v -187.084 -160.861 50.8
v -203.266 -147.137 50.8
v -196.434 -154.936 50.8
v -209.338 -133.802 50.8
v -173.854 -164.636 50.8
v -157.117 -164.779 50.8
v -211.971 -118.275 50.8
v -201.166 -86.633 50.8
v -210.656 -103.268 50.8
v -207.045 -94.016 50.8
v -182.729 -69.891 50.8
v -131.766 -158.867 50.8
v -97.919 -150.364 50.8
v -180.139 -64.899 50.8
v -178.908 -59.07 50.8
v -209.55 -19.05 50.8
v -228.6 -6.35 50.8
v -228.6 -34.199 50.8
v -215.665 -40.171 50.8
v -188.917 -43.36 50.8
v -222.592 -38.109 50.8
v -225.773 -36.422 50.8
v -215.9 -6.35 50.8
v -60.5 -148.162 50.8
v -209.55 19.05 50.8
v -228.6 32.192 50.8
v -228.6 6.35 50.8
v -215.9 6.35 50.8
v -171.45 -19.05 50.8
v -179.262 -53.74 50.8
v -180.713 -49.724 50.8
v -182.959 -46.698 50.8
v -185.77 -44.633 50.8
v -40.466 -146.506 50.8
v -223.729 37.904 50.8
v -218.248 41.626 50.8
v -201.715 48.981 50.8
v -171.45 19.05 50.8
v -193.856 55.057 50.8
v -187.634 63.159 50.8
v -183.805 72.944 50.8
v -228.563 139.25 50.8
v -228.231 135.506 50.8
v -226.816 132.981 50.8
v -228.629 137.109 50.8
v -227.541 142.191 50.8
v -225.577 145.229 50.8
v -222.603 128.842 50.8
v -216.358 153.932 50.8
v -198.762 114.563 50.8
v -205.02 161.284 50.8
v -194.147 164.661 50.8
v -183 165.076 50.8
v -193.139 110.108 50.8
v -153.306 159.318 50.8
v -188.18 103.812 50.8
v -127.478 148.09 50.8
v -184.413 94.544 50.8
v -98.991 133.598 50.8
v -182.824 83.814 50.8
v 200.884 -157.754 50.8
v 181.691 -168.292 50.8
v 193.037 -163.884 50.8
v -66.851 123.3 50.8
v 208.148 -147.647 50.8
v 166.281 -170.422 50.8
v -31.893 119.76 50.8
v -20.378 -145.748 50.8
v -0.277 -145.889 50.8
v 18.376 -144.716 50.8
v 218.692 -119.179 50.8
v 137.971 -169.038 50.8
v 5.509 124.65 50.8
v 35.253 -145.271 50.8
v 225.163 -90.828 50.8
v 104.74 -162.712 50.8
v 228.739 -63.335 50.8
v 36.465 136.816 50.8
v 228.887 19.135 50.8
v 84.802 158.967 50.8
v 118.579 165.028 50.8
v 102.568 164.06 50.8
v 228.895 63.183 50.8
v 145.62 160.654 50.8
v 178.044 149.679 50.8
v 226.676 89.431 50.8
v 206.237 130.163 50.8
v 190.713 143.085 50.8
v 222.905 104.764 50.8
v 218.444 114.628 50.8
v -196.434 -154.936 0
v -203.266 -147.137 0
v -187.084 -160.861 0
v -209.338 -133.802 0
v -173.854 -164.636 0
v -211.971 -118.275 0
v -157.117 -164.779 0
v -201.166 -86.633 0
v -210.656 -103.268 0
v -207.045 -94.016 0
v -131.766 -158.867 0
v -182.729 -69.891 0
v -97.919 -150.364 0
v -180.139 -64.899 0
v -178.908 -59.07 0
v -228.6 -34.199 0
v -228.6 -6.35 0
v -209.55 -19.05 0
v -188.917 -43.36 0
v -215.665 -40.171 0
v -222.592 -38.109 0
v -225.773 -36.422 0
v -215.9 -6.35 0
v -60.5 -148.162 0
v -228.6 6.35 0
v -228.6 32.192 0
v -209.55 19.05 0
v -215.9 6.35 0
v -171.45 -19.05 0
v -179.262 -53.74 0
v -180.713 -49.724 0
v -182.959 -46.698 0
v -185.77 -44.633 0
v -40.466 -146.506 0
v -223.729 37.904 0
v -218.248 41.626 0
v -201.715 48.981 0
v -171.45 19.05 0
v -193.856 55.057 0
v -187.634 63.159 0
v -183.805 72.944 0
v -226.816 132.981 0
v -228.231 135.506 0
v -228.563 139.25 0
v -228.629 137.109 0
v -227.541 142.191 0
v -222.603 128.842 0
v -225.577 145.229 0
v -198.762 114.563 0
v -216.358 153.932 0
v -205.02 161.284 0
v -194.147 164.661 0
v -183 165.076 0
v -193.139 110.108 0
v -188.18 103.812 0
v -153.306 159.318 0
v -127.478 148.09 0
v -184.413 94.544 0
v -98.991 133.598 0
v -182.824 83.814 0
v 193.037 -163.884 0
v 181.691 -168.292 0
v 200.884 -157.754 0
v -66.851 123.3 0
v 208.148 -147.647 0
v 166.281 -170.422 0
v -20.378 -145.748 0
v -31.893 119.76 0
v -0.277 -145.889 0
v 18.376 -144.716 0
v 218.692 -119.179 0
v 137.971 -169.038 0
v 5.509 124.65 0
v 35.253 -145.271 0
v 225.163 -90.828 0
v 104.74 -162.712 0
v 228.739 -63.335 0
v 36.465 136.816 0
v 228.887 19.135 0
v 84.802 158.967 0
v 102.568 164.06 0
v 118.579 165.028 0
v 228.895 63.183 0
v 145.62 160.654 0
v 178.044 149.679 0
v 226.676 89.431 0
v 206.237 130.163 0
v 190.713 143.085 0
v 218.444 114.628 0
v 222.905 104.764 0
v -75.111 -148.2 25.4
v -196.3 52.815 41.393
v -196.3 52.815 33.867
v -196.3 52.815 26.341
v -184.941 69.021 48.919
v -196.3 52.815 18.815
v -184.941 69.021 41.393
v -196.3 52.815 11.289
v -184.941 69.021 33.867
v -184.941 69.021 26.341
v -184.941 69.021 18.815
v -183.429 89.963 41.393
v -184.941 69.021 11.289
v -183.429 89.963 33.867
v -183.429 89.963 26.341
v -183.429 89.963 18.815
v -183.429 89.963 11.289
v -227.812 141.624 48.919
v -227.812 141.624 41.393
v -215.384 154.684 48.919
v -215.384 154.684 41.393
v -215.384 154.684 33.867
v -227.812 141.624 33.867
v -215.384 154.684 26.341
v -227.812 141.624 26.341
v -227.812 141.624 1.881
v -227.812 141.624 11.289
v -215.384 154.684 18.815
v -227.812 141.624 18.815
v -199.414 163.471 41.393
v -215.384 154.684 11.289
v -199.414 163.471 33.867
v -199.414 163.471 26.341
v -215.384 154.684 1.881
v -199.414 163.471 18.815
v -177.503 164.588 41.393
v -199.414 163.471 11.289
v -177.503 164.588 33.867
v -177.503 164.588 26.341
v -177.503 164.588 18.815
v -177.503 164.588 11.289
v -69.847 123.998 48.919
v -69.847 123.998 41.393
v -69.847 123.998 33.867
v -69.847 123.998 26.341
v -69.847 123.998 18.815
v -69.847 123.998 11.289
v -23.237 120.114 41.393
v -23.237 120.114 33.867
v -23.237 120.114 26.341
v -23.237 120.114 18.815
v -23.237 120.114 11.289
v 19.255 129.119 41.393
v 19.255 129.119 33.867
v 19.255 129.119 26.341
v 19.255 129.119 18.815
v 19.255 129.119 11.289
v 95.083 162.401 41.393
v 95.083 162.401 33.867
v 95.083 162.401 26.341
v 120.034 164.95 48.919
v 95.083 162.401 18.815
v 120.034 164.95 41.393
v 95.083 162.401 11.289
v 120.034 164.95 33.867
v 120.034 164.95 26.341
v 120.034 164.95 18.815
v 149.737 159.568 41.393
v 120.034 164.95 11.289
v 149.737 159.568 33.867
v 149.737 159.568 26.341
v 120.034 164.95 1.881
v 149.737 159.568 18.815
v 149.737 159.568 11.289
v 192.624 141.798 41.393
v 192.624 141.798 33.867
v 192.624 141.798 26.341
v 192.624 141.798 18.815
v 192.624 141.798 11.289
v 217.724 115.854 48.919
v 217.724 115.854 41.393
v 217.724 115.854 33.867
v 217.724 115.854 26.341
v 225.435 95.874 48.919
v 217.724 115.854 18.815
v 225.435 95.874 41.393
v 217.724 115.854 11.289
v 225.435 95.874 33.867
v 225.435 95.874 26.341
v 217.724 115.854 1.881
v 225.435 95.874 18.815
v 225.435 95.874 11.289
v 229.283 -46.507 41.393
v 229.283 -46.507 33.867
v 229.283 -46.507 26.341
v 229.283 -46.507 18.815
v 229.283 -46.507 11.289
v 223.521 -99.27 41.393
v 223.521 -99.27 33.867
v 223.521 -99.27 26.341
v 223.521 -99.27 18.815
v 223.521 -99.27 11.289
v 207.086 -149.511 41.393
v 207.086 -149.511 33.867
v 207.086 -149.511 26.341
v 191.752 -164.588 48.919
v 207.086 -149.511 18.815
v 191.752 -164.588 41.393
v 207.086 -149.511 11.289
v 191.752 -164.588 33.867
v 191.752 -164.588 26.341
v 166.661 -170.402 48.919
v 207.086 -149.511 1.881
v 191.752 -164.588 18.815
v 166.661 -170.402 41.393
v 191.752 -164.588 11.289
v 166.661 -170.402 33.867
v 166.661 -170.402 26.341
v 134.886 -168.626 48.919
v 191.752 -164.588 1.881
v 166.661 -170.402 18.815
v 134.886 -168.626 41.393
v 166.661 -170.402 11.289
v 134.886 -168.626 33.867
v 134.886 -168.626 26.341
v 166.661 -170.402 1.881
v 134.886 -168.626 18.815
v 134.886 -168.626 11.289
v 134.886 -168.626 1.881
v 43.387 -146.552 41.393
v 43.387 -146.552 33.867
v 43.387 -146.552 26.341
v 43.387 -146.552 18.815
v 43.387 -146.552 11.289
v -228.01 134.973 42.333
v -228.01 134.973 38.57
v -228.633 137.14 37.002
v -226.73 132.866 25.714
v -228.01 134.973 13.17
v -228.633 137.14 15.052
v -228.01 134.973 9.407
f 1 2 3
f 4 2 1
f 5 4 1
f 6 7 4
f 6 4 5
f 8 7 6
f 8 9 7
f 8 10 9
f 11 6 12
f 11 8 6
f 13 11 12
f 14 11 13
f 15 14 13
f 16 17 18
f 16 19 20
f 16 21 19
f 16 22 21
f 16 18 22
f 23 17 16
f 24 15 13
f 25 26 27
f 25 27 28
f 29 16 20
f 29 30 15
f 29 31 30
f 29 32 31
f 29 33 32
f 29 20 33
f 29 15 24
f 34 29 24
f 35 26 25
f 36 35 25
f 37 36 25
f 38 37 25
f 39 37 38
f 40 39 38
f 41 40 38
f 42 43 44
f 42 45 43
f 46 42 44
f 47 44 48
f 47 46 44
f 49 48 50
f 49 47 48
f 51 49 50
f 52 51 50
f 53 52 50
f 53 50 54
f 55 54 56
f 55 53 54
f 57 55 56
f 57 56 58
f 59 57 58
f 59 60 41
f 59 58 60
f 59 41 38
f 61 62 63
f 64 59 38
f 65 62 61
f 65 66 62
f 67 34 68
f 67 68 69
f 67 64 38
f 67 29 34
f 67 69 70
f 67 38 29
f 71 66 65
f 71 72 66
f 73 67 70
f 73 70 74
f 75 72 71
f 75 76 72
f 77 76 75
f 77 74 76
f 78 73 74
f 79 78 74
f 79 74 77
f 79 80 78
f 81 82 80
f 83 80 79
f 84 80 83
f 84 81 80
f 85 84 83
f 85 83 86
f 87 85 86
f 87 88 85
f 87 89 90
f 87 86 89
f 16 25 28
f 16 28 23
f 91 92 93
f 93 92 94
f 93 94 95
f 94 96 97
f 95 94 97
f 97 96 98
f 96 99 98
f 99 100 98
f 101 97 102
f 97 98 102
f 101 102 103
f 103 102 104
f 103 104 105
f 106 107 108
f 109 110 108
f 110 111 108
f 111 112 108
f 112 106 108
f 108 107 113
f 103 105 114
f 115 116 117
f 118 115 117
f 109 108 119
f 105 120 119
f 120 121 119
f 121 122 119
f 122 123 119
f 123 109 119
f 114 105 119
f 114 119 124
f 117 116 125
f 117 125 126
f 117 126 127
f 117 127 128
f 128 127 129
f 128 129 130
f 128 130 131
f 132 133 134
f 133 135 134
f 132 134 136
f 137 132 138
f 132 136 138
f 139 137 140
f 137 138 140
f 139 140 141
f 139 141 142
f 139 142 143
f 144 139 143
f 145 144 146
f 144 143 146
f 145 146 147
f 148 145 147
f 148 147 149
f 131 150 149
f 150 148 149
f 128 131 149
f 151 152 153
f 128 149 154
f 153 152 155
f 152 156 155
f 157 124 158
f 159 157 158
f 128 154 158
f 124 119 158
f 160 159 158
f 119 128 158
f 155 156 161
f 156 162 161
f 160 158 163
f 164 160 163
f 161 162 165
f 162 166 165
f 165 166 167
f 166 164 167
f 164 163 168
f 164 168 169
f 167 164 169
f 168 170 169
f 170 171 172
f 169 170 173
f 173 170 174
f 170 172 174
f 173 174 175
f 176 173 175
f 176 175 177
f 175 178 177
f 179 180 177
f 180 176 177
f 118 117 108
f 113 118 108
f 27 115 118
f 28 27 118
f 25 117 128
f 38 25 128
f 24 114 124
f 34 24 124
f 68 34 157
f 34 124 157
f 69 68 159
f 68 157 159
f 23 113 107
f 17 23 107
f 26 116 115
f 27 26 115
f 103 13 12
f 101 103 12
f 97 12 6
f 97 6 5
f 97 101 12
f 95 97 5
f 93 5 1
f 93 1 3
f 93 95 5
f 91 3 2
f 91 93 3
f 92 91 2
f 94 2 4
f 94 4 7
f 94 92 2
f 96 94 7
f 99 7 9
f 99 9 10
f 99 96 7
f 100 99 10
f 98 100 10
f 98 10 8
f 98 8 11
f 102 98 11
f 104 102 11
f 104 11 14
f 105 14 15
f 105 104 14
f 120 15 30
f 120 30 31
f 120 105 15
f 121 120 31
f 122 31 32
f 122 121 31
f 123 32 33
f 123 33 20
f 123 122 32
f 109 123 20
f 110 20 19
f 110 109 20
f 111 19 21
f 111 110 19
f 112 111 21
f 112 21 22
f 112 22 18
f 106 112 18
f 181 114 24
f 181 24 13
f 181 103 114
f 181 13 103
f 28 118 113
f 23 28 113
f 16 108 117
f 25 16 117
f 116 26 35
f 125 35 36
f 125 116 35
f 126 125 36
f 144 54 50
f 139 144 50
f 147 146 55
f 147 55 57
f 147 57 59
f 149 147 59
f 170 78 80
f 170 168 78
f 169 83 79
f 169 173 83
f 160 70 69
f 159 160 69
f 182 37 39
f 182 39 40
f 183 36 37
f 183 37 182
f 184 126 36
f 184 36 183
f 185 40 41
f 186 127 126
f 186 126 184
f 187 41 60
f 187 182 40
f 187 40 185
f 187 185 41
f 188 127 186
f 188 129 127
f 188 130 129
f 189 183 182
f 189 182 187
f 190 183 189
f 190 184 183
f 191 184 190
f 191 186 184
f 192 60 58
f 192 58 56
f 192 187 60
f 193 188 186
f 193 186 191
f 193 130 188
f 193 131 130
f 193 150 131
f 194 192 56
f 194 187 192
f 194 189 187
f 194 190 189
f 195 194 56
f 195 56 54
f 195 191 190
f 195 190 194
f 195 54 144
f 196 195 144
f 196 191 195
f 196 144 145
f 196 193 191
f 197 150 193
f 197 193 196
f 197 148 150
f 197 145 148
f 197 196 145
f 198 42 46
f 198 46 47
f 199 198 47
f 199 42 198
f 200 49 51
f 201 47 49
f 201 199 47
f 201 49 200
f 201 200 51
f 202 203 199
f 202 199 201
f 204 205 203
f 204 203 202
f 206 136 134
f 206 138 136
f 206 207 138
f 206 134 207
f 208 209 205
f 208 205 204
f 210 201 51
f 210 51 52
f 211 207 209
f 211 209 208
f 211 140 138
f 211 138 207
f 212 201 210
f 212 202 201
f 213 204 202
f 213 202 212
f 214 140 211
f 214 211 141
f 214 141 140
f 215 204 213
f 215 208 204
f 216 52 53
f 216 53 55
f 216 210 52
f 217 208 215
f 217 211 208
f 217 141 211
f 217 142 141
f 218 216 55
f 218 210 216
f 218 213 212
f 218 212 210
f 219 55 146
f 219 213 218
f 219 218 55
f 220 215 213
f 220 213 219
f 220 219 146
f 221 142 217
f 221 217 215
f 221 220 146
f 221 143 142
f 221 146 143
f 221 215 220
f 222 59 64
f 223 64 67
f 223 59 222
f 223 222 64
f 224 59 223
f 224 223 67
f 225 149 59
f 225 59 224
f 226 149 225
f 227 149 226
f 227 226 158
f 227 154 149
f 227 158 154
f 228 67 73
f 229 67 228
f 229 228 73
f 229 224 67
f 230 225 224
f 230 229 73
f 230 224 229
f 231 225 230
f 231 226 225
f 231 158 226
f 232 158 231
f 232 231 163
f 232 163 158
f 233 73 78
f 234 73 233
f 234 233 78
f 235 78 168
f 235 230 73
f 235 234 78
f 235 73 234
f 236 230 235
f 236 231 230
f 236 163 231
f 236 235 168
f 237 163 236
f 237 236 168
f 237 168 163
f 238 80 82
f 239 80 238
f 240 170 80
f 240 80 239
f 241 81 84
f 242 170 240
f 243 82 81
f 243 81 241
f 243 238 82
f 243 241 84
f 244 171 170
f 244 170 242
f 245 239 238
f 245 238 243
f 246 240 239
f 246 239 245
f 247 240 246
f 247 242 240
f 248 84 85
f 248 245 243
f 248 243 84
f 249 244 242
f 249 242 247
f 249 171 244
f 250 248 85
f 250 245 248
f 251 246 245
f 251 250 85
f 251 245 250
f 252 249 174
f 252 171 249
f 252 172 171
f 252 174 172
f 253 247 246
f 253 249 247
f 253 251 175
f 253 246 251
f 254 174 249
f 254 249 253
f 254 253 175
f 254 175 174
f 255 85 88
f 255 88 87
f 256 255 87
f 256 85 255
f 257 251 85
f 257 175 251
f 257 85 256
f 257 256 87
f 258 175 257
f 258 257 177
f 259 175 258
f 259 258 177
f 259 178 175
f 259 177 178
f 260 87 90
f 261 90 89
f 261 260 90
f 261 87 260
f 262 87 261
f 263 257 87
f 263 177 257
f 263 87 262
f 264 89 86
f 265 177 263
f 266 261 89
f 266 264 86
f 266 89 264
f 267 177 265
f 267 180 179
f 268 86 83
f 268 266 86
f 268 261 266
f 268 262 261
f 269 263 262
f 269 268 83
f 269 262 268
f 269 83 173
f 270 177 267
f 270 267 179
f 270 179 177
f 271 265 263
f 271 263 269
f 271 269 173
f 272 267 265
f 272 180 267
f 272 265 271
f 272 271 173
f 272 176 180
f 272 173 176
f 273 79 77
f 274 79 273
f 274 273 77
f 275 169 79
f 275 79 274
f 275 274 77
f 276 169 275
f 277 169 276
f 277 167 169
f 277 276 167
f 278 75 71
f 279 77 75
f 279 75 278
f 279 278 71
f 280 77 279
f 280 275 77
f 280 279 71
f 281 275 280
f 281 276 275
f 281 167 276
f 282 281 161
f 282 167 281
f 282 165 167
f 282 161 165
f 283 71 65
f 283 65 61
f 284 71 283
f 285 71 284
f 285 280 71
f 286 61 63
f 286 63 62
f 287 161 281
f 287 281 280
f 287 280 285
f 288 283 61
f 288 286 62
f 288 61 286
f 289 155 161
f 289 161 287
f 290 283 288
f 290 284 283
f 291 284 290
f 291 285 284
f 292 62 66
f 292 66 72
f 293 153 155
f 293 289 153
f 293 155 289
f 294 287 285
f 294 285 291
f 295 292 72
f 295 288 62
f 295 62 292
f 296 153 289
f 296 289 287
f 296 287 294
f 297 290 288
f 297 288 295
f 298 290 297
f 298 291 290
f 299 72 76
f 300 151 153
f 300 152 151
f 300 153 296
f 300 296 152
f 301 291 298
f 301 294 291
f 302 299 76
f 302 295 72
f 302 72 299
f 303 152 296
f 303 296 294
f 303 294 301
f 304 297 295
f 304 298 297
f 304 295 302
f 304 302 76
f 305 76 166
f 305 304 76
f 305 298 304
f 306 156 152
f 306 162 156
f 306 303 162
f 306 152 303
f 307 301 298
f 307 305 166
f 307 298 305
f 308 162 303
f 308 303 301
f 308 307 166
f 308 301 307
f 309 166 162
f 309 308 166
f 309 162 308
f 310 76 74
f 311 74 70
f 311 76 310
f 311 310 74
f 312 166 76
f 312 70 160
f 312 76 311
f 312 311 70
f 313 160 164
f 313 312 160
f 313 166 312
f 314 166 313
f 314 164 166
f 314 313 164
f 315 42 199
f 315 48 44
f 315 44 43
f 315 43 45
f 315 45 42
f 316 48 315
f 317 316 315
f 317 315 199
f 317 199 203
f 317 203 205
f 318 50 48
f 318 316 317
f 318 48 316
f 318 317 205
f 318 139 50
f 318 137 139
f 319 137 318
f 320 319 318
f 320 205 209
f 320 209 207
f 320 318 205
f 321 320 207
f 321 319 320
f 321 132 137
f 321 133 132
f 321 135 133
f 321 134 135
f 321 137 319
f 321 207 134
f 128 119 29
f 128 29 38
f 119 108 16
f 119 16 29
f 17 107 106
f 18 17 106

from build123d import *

# Parameters (mm, degrees)
F0_W     = 38.1
F0_H     = 38.1
F1_DEPTH = 50.8


with BuildPart() as f1:
    # F0 (on Top) → F1 (new body)
    with BuildSketch(Plane.XY):
        with BuildLine():
            Line((-228.6, 32.1917161345), (-228.6, 6.35))
            Line((-228.6, 6.35), (-215.9, 6.35))
            Line((-215.9, 6.35), (-215.9, -6.35))
            Line((-215.9, -6.35), (-228.6, -6.35))
            Line((-228.6, -6.35), (-228.6, -34.1989696026))
            add(Edge.make_bspline(
                [(-60.5002641678, -148.1617689133), (-66.5005939975, -148.1920038294), (-73.2961742589, -147.7400798137), (-113.8053654337, -150.7602742609), (-159.0025882902, -170.6546271451), (-210.2629173909, -157.2359768705), (-217.554857804, -88.5993198257), (-176.493256404, -74.2755969971), (-178.6218818379, -34.4669105888), (-217.486655562, -44.8664744461), (-228.6, -34.1989696026)],
                knots=[0.7551474079, 0.7551474079, 0.7551474079, 0.7551474079, 0.7709603375, 0.797321274, 0.8281985508, 0.8569640319, 0.8887766406, 0.9150101165, 0.9359092043, 0.9648400573, 0.9648400573, 0.9648400573, 0.9648400573], degree=3))
            ThreePointArc((-60.5002641678, -148.1617689133), (-30.426607809, -146.014377891), (-0.2766438162, -145.8888142753))
            add(Edge.make_bspline(
                [(-228.6, 32.1917161345), (-221.842404284, 42.7562656596), (-202.2675149277, 44.3254987929), (-179.2330180071, 69.4717636205), (-185.0075932705, 107.0495276869), (-206.3151011845, 119.2412421658), (-237.2938577645, 135.5477688838), (-214.5215066994, 156.5638416404), (-191.1558469206, 170.1168033125), (-137.9504249958, 156.2201135467), (-117.4820801505, 140.5399957432), (-69.4089325992, 121.1981346936), (-26.1295527608, 118.3192775912), (13.3922603976, 125.0054796597), (44.1790163062, 140.8740829992), (75.3340703353, 155.1567259182), (114.979025581, 172.0791756849), (180.9319317383, 150.3972339265), (198.7233235329, 137.7992502734), (222.9592193706, 114.3998560963), (231.0968349346, 69.5357158437), (227.151302935, -14.8262371264), (231.4981557673, -63.3730305184), (217.6910113022, -130.9001658988), (195.5401577855, -175.3182842089), (113.225990128, -168.7347991647), (39.6261978432, -141.9301941848), (15.666877208, -144.8577880121), (-0.1842328972, -145.8828575521), (-0.2766438162, -145.8888142753)],
                knots=[0, 0, 0, 0, 0.023526495, 0.0472150591, 0.071976495, 0.0937567881, 0.1160251968, 0.1361214471, 0.1589295174, 0.1896491945, 0.2123633437, 0.2426795653, 0.2715030285, 0.2984604786, 0.3236752725, 0.3486429477, 0.3768921666, 0.4118773119, 0.4324349076, 0.4559076572, 0.4849876683, 0.5244190328, 0.5554779008, 0.5907664036, 0.6188059718, 0.6563222449, 0.6944312953, 0.721571422, 0.7217302364, 0.7217302364, 0.7217302364, 0.7217302364], degree=3))
        make_face()
        with Locations((-190.5, 0)):
            Rectangle(F0_W, F0_H, mode=Mode.SUBTRACT)
    extrude(amount=F1_DEPTH)


solid = f1.part
